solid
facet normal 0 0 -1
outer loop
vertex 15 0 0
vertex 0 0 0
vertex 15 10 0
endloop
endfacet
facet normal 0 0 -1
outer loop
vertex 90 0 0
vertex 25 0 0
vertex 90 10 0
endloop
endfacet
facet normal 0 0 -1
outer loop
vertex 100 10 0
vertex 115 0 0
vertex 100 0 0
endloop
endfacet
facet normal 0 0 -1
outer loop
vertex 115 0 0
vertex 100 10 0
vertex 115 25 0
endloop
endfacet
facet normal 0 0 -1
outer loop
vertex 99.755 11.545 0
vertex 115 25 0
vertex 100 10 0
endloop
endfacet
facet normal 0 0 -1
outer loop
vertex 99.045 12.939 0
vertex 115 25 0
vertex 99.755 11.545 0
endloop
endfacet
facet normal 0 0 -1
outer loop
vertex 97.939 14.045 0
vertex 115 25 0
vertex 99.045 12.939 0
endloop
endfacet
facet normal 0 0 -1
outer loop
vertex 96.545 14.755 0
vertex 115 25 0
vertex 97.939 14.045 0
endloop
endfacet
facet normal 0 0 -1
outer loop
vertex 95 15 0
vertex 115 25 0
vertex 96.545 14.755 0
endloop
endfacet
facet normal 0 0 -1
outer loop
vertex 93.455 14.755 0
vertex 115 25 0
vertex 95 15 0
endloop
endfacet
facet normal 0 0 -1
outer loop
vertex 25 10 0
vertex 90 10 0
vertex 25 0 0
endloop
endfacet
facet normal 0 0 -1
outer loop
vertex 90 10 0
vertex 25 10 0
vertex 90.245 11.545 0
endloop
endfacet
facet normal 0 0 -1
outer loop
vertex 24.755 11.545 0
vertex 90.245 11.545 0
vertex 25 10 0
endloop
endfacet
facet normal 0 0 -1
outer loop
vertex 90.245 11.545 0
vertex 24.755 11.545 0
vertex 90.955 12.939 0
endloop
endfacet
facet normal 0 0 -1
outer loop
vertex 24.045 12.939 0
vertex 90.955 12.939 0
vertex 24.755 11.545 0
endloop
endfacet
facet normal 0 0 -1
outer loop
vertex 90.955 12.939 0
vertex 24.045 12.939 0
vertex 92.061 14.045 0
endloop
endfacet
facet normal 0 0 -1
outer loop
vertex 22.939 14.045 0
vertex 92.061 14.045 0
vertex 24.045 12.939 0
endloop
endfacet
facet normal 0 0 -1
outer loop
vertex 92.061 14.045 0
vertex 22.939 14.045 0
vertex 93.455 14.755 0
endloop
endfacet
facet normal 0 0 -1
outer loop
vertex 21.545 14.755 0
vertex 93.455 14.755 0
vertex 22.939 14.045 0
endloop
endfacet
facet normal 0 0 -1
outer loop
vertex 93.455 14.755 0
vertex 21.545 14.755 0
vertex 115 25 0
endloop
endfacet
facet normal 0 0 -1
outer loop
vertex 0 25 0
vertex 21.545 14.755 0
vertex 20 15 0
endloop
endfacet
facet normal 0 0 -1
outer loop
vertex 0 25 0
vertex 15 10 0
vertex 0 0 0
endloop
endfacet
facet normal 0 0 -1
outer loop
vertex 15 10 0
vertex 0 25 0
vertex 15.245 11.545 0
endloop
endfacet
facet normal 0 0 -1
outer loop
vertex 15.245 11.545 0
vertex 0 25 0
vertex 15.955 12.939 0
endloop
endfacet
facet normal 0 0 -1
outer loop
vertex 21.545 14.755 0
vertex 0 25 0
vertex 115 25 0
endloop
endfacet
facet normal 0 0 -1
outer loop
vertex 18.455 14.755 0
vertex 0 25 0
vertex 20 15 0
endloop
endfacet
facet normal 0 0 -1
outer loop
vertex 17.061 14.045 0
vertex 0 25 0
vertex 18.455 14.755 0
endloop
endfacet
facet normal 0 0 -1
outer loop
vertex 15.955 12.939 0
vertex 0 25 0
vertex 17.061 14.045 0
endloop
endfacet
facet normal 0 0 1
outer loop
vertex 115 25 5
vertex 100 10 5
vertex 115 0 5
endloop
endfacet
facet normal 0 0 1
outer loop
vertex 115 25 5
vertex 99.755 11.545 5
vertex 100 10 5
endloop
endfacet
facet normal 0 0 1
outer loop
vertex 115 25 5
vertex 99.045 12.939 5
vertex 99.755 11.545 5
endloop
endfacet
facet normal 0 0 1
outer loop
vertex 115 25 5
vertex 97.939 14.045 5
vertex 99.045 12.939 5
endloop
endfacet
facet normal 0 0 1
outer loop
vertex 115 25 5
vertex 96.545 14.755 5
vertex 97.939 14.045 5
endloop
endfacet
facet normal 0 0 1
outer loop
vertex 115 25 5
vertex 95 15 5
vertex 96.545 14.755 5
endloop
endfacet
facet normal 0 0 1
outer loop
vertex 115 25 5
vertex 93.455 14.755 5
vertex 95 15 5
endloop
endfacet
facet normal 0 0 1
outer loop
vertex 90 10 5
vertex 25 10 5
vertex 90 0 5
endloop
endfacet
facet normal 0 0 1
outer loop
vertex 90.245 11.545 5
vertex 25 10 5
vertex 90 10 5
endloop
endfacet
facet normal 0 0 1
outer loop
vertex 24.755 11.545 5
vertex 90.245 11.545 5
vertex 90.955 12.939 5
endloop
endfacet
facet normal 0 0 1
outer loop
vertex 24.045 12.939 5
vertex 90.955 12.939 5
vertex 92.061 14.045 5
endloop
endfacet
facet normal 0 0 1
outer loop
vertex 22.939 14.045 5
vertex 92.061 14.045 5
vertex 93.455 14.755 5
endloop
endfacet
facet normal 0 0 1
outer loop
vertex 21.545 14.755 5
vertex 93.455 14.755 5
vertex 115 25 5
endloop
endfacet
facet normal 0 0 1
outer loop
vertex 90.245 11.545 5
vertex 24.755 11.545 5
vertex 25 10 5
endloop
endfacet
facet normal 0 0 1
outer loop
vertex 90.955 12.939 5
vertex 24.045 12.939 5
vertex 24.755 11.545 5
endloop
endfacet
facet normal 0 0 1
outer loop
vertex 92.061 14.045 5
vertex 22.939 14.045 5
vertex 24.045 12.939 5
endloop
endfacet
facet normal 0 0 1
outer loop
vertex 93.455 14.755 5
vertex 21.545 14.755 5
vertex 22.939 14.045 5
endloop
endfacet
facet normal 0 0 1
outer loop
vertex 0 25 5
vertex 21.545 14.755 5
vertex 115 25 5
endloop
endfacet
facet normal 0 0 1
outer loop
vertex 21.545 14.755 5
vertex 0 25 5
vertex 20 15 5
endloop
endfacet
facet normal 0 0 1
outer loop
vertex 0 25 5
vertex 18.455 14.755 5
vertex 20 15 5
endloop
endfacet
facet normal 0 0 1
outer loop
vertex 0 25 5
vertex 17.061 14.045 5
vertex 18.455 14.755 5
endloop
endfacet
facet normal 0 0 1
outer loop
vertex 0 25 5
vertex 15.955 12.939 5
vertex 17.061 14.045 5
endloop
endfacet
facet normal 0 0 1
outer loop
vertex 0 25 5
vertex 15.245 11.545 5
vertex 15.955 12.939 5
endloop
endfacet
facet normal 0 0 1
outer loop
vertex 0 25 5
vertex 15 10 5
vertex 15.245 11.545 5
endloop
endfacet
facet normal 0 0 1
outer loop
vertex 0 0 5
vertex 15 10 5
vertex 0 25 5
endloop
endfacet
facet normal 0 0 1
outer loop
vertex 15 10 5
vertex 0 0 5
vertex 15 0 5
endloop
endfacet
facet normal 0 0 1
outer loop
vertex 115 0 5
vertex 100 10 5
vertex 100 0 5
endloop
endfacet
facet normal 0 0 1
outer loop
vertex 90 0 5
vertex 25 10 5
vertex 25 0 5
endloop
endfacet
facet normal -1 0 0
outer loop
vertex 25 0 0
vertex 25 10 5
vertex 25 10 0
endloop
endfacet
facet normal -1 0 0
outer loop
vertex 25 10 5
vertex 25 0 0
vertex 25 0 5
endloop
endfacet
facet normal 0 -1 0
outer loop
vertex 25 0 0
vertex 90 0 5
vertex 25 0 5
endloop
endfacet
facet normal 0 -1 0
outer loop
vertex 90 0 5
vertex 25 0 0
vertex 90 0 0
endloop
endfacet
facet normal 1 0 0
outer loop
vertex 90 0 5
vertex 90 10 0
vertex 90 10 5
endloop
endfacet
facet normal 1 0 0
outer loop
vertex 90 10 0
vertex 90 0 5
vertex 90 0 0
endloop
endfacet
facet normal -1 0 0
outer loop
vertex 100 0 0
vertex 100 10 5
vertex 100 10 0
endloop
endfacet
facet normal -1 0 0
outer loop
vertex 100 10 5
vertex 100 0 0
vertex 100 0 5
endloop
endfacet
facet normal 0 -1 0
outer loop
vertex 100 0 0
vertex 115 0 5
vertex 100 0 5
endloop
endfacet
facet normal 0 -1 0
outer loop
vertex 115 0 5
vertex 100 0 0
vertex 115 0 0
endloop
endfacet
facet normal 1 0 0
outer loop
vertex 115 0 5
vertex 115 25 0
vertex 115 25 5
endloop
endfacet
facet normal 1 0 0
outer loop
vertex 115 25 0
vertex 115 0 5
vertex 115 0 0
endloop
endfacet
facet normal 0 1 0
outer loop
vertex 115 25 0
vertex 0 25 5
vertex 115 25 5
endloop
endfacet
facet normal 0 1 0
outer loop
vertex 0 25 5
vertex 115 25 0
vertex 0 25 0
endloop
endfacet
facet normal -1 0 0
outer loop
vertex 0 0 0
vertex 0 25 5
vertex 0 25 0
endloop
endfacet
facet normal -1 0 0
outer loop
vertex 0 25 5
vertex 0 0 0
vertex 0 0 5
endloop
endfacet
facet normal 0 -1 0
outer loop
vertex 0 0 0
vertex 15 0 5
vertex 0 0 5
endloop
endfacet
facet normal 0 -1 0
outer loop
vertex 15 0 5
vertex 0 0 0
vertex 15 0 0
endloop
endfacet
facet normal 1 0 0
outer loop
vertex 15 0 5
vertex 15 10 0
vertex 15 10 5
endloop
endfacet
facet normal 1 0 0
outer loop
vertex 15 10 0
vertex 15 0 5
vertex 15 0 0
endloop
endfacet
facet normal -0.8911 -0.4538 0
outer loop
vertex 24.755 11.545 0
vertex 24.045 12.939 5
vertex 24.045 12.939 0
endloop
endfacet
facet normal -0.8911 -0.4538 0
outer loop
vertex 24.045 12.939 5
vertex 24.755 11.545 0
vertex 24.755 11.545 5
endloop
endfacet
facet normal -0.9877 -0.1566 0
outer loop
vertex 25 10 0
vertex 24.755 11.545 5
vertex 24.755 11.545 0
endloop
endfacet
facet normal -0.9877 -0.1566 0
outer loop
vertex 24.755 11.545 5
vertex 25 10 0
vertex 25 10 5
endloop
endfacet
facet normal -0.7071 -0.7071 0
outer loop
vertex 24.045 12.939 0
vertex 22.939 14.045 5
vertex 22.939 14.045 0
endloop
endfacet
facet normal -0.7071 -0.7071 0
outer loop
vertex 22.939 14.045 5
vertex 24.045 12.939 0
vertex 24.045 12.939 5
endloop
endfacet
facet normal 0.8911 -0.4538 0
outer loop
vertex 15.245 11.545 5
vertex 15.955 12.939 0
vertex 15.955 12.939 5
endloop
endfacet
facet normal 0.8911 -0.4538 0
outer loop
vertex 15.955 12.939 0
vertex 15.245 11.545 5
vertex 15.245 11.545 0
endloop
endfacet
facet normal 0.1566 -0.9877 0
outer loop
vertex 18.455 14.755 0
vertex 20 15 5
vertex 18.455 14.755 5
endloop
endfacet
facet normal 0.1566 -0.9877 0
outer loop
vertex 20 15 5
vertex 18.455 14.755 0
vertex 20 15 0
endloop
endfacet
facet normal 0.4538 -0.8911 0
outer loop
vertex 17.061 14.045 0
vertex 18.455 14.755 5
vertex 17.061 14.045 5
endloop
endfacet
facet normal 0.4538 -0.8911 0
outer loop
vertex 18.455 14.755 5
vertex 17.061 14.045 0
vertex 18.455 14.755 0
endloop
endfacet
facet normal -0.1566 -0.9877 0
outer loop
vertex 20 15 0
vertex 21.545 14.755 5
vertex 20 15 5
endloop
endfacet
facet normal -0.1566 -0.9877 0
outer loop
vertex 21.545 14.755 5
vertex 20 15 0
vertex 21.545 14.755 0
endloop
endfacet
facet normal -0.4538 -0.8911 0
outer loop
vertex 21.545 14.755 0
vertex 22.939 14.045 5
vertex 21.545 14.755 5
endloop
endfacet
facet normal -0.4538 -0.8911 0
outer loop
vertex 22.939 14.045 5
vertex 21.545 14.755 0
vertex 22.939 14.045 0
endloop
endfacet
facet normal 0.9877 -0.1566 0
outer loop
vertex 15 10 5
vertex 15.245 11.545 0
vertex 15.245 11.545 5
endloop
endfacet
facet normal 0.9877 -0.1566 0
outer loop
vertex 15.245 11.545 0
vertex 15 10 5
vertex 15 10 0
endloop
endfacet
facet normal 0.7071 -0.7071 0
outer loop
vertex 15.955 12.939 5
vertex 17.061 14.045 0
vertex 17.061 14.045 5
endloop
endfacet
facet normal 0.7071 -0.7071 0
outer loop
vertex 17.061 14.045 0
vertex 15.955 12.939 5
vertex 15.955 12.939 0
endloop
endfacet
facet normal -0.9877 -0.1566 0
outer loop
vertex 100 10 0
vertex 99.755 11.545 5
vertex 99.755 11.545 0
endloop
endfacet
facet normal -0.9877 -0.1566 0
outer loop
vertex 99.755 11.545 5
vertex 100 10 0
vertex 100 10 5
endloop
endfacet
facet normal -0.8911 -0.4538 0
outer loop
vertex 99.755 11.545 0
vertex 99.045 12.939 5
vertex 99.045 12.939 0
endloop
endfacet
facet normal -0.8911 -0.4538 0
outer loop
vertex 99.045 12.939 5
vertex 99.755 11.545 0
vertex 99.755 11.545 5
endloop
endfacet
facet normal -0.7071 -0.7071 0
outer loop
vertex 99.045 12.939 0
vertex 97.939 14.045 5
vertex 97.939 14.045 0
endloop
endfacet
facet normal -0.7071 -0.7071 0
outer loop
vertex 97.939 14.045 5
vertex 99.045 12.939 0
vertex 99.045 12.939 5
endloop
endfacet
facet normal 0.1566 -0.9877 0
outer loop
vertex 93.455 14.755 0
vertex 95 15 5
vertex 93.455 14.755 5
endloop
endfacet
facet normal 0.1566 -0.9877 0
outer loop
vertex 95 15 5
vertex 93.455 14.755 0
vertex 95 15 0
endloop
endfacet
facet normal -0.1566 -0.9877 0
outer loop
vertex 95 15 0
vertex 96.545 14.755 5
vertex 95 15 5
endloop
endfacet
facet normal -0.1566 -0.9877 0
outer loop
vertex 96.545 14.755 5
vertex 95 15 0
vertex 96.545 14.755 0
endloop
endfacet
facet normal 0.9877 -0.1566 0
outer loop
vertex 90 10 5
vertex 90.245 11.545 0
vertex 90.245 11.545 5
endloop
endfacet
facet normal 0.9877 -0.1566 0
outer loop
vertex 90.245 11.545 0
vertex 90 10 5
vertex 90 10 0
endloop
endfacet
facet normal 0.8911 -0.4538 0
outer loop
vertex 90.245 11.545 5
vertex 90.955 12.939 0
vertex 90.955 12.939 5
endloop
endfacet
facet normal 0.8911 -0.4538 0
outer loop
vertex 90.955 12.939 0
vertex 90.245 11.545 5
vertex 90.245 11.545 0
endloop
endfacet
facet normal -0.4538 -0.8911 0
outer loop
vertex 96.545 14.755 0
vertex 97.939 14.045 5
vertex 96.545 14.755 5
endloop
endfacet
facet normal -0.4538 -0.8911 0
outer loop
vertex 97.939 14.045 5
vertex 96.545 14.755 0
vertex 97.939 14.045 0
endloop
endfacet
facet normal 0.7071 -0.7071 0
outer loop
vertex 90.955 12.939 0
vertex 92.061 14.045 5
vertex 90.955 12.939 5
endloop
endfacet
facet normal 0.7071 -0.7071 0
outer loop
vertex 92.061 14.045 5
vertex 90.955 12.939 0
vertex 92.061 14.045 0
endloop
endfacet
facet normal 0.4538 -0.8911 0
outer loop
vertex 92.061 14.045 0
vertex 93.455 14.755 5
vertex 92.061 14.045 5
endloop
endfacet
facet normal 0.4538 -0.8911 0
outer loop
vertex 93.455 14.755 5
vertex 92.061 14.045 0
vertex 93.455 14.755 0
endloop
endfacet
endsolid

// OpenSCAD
/*
* Cupboard Doors Holder
* This was designed to prevent my cats from
* Opening my kitchen/bathroom cupboards
* (Yes I've got quite Eveil cats ;) )
*/


/* 
*  Configuration Variables
*/

Thickness = 5 ;
Knob_Width = 10 ;
Inner_Knob_Distance = 65 ;

/* [Hidden] */
Strenght_Factor = 1.5 ;

// End Configuration

module cupboard_doorstop(THICKNESS, KNOB_WIDTH, INNER_KNOB_DISTANCE, STRENGHT_FACTOR)
{
	TOTAL_HEIGHT = KNOB_WIDTH + KNOB_WIDTH*STRENGHT_FACTOR ;
	TOTAL_LENGTH = KNOB_WIDTH*2 + (KNOB_WIDTH*STRENGHT_FACTOR)*2 + INNER_KNOB_DISTANCE ;
	
	difference() {
		difference() {
			linear_extrude(height = THICKNESS, center = false, convexity = 10, twist = 0)
			polygon(points=[[0,0],[0,TOTAL_HEIGHT],[TOTAL_LENGTH,TOTAL_HEIGHT],[TOTAL_LENGTH,0],[TOTAL_LENGTH-(KNOB_WIDTH*STRENGHT_FACTOR),0],[TOTAL_LENGTH-(KNOB_WIDTH*STRENGHT_FACTOR),KNOB_WIDTH],[TOTAL_LENGTH-(KNOB_WIDTH*STRENGHT_FACTOR)-KNOB_WIDTH,KNOB_WIDTH],[TOTAL_LENGTH-(KNOB_WIDTH*STRENGHT_FACTOR)-KNOB_WIDTH,0],[KNOB_WIDTH*STRENGHT_FACTOR+KNOB_WIDTH,0],[KNOB_WIDTH*STRENGHT_FACTOR+KNOB_WIDTH,KNOB_WIDTH],[KNOB_WIDTH*STRENGHT_FACTOR,KNOB_WIDTH],[KNOB_WIDTH*STRENGHT_FACTOR,0]]);
			
			translate([KNOB_WIDTH*STRENGHT_FACTOR+(KNOB_WIDTH/2),KNOB_WIDTH,-0.5])
			cylinder(h= THICKNESS+1, r=KNOB_WIDTH/2, $fn=20) ;
		}
		translate([TOTAL_LENGTH-(KNOB_WIDTH*STRENGHT_FACTOR+(KNOB_WIDTH/2)),KNOB_WIDTH,-0.5])
		cylinder(h= THICKNESS+1, r=KNOB_WIDTH/2, $fn=20) ;
	}
}



// Draw it ;)
cupboard_doorstop(Thickness, Knob_Width, Inner_Knob_Distance, Strenght_Factor);
